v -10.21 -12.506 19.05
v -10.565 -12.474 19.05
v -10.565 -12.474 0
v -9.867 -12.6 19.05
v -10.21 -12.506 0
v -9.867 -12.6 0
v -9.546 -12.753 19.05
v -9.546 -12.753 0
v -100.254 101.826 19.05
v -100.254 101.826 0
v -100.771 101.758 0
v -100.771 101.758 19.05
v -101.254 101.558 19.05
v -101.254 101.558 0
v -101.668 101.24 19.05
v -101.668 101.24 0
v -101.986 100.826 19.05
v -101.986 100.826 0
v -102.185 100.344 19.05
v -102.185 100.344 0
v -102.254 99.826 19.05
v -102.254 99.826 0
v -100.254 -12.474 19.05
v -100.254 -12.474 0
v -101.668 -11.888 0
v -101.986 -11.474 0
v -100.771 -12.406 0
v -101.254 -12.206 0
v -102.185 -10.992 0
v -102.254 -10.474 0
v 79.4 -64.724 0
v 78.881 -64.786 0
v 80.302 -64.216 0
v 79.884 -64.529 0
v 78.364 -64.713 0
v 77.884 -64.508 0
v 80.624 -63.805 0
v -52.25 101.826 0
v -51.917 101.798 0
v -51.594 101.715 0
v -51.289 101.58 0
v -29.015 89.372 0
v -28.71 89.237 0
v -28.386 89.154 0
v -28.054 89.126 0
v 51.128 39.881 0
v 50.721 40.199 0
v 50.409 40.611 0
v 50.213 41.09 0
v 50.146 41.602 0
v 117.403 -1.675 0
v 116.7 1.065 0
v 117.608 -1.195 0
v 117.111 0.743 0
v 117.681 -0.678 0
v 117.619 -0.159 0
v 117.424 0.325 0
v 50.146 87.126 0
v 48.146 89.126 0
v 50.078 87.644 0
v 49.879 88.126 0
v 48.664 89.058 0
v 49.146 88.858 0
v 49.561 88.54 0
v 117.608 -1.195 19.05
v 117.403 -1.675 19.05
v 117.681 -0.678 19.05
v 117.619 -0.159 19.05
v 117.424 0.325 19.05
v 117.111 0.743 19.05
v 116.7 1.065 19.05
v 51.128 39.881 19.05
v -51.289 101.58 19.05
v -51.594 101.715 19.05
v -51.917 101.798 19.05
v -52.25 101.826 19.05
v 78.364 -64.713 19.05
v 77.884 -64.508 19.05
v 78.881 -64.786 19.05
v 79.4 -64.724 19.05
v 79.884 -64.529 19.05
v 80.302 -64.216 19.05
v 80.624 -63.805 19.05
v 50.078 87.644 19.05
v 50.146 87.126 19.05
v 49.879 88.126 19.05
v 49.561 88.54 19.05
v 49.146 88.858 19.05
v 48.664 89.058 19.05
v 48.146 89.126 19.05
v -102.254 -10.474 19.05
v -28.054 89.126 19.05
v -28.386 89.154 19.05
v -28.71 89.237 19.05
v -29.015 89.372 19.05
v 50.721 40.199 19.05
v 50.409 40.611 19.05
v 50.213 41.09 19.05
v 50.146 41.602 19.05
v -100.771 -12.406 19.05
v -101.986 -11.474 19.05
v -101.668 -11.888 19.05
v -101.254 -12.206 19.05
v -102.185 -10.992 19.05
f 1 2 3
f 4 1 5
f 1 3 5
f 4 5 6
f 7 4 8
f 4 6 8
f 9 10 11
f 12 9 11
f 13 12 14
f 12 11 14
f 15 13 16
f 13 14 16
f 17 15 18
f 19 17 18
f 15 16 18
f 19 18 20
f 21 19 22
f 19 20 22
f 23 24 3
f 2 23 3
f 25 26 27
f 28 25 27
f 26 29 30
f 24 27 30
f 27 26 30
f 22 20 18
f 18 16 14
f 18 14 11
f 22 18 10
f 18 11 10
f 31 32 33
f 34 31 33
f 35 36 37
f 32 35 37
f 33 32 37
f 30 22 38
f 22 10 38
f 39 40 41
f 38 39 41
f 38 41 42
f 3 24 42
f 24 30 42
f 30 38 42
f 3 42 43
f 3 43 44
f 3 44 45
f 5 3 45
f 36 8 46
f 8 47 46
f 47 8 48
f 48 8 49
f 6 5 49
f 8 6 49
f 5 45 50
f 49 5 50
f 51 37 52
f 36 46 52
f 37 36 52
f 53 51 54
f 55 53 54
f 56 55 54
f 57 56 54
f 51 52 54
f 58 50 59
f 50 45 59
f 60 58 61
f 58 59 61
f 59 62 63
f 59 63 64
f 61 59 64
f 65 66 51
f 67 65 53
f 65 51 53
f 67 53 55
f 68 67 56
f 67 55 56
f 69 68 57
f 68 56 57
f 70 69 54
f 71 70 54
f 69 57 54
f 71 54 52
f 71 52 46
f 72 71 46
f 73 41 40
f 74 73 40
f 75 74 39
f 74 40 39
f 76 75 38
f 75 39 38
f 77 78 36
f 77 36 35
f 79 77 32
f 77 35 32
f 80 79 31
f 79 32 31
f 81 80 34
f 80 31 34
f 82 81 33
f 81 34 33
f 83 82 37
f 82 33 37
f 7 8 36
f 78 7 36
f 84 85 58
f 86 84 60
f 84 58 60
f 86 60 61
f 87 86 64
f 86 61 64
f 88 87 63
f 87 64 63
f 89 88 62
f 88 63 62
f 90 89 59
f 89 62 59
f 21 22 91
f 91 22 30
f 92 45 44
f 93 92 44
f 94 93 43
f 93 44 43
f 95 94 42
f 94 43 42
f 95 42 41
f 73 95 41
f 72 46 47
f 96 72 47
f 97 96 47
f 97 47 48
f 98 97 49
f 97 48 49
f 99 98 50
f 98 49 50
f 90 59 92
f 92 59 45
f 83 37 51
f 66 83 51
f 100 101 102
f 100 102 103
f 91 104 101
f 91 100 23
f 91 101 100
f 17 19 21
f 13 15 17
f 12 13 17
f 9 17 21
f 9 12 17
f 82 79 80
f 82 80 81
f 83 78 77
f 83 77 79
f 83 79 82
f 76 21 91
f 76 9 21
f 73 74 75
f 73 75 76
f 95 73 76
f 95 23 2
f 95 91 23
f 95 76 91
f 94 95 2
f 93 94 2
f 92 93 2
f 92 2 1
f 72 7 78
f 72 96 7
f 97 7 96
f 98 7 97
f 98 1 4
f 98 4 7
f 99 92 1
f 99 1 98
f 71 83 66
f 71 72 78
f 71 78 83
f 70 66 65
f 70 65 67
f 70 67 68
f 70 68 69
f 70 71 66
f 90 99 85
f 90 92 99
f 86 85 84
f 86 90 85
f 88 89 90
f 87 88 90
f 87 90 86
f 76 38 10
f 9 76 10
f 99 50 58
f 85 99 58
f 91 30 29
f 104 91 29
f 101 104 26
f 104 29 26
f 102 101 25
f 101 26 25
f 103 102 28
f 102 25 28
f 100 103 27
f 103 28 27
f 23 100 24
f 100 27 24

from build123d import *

# Parameters (mm, degrees)
F1_DEPTH = 19.05


with BuildPart() as f1:
    # F0 (on Top) → F1 (new body)
    with BuildSketch(Plane.XY):
        with BuildLine():
            ThreePointArc((-100.25353, 101.826), (-101.667744, 101.240213), (-102.25353, 99.826))
            Line((-102.25353, 99.826), (-102.25353, -10.474))
            ThreePointArc((-102.25353, -10.474), (-101.667744, -11.888214), (-100.25353, -12.474))
            Line((-100.25353, -12.474), (-10.564581, -12.474))
            ThreePointArc((-10.564581, -12.474), (-10.036438, -12.544994), (-9.545789, -12.752936))
            Line((-9.545789, -12.752936), (77.88431, -64.507527))
            ThreePointArc((77.88431, -64.507527), (79.399684, -64.723833), (80.624166, -63.805253))
            Line((80.624166, -63.805253), (117.402527, -1.674808))
            ThreePointArc((117.402527, -1.674808), (117.618833, -0.159434), (116.700253, 1.065048))
            Line((116.700253, 1.065048), (51.127679, 39.880991))
            ThreePointArc((51.127679, 39.880991), (50.409003, 40.611496), (50.14647, 41.602056))
            Line((50.14647, 41.602056), (50.14647, 87.126))
            ThreePointArc((50.14647, 87.126), (49.560684, 88.540213), (48.14647, 89.126))
            Line((48.14647, 89.126), (-28.05353, 89.126))
            ThreePointArc((-28.05353, 89.126), (-28.549656, 89.188512), (-29.014768, 89.37214))
            Line((-29.014768, 89.37214), (-51.28878, 101.579859))
            ThreePointArc((-51.28878, 101.579859), (-51.753892, 101.763487), (-52.250017, 101.826))
            Line((-52.250017, 101.826), (-100.25353, 101.826))
        make_face()
    extrude(amount=F1_DEPTH)


solid = f1.part
